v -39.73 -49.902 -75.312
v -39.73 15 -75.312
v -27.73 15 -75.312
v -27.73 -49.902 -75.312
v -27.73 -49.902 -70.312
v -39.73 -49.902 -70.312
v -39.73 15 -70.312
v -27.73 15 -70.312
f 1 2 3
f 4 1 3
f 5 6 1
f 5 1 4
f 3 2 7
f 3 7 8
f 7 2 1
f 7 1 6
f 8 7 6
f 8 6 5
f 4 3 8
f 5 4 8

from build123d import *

# Parameters (mm, degrees)
SKETCH2_W           = 12
SKETCH2_H           = 5
BOSS_EXTRUDE1_DEPTH = 15
SKETCH3_W           = 12
SKETCH3_H           = 5
BOSS_EXTRUDE2_DEPTH = 57.00164
SKETCH4_W           = 12
SKETCH4_H           = 5
CUT_EXTRUDE1_DEPTH  = 7.1


with BuildPart() as part:
    # Sketch2 → Boss-Extrude1 (new body)
    with BuildSketch(Plane(origin=(0, 0, 0), x_dir=(1, 0, 0), z_dir=(0, 1, 0))):
        with Locations((-33.729716691, 72.811583722)):
            Rectangle(SKETCH2_W, SKETCH2_H)
    extrude(amount=BOSS_EXTRUDE1_DEPTH)

    # Sketch3 → Boss-Extrude2 (add)
    with BuildSketch(Plane.XZ):
        with Locations((-33.729716691, -72.811583722)):
            Rectangle(SKETCH3_W, SKETCH3_H)
    extrude(amount=BOSS_EXTRUDE2_DEPTH)

    # Sketch4 → Cut-Extrude1 (cut)
    with BuildSketch(Plane.XZ.offset(57.001640055)):
        with Locations((-33.729716691, -72.811583722)):
            Rectangle(SKETCH4_W, SKETCH4_H)
    extrude(amount=-CUT_EXTRUDE1_DEPTH, mode=Mode.SUBTRACT)


solid = part.part
